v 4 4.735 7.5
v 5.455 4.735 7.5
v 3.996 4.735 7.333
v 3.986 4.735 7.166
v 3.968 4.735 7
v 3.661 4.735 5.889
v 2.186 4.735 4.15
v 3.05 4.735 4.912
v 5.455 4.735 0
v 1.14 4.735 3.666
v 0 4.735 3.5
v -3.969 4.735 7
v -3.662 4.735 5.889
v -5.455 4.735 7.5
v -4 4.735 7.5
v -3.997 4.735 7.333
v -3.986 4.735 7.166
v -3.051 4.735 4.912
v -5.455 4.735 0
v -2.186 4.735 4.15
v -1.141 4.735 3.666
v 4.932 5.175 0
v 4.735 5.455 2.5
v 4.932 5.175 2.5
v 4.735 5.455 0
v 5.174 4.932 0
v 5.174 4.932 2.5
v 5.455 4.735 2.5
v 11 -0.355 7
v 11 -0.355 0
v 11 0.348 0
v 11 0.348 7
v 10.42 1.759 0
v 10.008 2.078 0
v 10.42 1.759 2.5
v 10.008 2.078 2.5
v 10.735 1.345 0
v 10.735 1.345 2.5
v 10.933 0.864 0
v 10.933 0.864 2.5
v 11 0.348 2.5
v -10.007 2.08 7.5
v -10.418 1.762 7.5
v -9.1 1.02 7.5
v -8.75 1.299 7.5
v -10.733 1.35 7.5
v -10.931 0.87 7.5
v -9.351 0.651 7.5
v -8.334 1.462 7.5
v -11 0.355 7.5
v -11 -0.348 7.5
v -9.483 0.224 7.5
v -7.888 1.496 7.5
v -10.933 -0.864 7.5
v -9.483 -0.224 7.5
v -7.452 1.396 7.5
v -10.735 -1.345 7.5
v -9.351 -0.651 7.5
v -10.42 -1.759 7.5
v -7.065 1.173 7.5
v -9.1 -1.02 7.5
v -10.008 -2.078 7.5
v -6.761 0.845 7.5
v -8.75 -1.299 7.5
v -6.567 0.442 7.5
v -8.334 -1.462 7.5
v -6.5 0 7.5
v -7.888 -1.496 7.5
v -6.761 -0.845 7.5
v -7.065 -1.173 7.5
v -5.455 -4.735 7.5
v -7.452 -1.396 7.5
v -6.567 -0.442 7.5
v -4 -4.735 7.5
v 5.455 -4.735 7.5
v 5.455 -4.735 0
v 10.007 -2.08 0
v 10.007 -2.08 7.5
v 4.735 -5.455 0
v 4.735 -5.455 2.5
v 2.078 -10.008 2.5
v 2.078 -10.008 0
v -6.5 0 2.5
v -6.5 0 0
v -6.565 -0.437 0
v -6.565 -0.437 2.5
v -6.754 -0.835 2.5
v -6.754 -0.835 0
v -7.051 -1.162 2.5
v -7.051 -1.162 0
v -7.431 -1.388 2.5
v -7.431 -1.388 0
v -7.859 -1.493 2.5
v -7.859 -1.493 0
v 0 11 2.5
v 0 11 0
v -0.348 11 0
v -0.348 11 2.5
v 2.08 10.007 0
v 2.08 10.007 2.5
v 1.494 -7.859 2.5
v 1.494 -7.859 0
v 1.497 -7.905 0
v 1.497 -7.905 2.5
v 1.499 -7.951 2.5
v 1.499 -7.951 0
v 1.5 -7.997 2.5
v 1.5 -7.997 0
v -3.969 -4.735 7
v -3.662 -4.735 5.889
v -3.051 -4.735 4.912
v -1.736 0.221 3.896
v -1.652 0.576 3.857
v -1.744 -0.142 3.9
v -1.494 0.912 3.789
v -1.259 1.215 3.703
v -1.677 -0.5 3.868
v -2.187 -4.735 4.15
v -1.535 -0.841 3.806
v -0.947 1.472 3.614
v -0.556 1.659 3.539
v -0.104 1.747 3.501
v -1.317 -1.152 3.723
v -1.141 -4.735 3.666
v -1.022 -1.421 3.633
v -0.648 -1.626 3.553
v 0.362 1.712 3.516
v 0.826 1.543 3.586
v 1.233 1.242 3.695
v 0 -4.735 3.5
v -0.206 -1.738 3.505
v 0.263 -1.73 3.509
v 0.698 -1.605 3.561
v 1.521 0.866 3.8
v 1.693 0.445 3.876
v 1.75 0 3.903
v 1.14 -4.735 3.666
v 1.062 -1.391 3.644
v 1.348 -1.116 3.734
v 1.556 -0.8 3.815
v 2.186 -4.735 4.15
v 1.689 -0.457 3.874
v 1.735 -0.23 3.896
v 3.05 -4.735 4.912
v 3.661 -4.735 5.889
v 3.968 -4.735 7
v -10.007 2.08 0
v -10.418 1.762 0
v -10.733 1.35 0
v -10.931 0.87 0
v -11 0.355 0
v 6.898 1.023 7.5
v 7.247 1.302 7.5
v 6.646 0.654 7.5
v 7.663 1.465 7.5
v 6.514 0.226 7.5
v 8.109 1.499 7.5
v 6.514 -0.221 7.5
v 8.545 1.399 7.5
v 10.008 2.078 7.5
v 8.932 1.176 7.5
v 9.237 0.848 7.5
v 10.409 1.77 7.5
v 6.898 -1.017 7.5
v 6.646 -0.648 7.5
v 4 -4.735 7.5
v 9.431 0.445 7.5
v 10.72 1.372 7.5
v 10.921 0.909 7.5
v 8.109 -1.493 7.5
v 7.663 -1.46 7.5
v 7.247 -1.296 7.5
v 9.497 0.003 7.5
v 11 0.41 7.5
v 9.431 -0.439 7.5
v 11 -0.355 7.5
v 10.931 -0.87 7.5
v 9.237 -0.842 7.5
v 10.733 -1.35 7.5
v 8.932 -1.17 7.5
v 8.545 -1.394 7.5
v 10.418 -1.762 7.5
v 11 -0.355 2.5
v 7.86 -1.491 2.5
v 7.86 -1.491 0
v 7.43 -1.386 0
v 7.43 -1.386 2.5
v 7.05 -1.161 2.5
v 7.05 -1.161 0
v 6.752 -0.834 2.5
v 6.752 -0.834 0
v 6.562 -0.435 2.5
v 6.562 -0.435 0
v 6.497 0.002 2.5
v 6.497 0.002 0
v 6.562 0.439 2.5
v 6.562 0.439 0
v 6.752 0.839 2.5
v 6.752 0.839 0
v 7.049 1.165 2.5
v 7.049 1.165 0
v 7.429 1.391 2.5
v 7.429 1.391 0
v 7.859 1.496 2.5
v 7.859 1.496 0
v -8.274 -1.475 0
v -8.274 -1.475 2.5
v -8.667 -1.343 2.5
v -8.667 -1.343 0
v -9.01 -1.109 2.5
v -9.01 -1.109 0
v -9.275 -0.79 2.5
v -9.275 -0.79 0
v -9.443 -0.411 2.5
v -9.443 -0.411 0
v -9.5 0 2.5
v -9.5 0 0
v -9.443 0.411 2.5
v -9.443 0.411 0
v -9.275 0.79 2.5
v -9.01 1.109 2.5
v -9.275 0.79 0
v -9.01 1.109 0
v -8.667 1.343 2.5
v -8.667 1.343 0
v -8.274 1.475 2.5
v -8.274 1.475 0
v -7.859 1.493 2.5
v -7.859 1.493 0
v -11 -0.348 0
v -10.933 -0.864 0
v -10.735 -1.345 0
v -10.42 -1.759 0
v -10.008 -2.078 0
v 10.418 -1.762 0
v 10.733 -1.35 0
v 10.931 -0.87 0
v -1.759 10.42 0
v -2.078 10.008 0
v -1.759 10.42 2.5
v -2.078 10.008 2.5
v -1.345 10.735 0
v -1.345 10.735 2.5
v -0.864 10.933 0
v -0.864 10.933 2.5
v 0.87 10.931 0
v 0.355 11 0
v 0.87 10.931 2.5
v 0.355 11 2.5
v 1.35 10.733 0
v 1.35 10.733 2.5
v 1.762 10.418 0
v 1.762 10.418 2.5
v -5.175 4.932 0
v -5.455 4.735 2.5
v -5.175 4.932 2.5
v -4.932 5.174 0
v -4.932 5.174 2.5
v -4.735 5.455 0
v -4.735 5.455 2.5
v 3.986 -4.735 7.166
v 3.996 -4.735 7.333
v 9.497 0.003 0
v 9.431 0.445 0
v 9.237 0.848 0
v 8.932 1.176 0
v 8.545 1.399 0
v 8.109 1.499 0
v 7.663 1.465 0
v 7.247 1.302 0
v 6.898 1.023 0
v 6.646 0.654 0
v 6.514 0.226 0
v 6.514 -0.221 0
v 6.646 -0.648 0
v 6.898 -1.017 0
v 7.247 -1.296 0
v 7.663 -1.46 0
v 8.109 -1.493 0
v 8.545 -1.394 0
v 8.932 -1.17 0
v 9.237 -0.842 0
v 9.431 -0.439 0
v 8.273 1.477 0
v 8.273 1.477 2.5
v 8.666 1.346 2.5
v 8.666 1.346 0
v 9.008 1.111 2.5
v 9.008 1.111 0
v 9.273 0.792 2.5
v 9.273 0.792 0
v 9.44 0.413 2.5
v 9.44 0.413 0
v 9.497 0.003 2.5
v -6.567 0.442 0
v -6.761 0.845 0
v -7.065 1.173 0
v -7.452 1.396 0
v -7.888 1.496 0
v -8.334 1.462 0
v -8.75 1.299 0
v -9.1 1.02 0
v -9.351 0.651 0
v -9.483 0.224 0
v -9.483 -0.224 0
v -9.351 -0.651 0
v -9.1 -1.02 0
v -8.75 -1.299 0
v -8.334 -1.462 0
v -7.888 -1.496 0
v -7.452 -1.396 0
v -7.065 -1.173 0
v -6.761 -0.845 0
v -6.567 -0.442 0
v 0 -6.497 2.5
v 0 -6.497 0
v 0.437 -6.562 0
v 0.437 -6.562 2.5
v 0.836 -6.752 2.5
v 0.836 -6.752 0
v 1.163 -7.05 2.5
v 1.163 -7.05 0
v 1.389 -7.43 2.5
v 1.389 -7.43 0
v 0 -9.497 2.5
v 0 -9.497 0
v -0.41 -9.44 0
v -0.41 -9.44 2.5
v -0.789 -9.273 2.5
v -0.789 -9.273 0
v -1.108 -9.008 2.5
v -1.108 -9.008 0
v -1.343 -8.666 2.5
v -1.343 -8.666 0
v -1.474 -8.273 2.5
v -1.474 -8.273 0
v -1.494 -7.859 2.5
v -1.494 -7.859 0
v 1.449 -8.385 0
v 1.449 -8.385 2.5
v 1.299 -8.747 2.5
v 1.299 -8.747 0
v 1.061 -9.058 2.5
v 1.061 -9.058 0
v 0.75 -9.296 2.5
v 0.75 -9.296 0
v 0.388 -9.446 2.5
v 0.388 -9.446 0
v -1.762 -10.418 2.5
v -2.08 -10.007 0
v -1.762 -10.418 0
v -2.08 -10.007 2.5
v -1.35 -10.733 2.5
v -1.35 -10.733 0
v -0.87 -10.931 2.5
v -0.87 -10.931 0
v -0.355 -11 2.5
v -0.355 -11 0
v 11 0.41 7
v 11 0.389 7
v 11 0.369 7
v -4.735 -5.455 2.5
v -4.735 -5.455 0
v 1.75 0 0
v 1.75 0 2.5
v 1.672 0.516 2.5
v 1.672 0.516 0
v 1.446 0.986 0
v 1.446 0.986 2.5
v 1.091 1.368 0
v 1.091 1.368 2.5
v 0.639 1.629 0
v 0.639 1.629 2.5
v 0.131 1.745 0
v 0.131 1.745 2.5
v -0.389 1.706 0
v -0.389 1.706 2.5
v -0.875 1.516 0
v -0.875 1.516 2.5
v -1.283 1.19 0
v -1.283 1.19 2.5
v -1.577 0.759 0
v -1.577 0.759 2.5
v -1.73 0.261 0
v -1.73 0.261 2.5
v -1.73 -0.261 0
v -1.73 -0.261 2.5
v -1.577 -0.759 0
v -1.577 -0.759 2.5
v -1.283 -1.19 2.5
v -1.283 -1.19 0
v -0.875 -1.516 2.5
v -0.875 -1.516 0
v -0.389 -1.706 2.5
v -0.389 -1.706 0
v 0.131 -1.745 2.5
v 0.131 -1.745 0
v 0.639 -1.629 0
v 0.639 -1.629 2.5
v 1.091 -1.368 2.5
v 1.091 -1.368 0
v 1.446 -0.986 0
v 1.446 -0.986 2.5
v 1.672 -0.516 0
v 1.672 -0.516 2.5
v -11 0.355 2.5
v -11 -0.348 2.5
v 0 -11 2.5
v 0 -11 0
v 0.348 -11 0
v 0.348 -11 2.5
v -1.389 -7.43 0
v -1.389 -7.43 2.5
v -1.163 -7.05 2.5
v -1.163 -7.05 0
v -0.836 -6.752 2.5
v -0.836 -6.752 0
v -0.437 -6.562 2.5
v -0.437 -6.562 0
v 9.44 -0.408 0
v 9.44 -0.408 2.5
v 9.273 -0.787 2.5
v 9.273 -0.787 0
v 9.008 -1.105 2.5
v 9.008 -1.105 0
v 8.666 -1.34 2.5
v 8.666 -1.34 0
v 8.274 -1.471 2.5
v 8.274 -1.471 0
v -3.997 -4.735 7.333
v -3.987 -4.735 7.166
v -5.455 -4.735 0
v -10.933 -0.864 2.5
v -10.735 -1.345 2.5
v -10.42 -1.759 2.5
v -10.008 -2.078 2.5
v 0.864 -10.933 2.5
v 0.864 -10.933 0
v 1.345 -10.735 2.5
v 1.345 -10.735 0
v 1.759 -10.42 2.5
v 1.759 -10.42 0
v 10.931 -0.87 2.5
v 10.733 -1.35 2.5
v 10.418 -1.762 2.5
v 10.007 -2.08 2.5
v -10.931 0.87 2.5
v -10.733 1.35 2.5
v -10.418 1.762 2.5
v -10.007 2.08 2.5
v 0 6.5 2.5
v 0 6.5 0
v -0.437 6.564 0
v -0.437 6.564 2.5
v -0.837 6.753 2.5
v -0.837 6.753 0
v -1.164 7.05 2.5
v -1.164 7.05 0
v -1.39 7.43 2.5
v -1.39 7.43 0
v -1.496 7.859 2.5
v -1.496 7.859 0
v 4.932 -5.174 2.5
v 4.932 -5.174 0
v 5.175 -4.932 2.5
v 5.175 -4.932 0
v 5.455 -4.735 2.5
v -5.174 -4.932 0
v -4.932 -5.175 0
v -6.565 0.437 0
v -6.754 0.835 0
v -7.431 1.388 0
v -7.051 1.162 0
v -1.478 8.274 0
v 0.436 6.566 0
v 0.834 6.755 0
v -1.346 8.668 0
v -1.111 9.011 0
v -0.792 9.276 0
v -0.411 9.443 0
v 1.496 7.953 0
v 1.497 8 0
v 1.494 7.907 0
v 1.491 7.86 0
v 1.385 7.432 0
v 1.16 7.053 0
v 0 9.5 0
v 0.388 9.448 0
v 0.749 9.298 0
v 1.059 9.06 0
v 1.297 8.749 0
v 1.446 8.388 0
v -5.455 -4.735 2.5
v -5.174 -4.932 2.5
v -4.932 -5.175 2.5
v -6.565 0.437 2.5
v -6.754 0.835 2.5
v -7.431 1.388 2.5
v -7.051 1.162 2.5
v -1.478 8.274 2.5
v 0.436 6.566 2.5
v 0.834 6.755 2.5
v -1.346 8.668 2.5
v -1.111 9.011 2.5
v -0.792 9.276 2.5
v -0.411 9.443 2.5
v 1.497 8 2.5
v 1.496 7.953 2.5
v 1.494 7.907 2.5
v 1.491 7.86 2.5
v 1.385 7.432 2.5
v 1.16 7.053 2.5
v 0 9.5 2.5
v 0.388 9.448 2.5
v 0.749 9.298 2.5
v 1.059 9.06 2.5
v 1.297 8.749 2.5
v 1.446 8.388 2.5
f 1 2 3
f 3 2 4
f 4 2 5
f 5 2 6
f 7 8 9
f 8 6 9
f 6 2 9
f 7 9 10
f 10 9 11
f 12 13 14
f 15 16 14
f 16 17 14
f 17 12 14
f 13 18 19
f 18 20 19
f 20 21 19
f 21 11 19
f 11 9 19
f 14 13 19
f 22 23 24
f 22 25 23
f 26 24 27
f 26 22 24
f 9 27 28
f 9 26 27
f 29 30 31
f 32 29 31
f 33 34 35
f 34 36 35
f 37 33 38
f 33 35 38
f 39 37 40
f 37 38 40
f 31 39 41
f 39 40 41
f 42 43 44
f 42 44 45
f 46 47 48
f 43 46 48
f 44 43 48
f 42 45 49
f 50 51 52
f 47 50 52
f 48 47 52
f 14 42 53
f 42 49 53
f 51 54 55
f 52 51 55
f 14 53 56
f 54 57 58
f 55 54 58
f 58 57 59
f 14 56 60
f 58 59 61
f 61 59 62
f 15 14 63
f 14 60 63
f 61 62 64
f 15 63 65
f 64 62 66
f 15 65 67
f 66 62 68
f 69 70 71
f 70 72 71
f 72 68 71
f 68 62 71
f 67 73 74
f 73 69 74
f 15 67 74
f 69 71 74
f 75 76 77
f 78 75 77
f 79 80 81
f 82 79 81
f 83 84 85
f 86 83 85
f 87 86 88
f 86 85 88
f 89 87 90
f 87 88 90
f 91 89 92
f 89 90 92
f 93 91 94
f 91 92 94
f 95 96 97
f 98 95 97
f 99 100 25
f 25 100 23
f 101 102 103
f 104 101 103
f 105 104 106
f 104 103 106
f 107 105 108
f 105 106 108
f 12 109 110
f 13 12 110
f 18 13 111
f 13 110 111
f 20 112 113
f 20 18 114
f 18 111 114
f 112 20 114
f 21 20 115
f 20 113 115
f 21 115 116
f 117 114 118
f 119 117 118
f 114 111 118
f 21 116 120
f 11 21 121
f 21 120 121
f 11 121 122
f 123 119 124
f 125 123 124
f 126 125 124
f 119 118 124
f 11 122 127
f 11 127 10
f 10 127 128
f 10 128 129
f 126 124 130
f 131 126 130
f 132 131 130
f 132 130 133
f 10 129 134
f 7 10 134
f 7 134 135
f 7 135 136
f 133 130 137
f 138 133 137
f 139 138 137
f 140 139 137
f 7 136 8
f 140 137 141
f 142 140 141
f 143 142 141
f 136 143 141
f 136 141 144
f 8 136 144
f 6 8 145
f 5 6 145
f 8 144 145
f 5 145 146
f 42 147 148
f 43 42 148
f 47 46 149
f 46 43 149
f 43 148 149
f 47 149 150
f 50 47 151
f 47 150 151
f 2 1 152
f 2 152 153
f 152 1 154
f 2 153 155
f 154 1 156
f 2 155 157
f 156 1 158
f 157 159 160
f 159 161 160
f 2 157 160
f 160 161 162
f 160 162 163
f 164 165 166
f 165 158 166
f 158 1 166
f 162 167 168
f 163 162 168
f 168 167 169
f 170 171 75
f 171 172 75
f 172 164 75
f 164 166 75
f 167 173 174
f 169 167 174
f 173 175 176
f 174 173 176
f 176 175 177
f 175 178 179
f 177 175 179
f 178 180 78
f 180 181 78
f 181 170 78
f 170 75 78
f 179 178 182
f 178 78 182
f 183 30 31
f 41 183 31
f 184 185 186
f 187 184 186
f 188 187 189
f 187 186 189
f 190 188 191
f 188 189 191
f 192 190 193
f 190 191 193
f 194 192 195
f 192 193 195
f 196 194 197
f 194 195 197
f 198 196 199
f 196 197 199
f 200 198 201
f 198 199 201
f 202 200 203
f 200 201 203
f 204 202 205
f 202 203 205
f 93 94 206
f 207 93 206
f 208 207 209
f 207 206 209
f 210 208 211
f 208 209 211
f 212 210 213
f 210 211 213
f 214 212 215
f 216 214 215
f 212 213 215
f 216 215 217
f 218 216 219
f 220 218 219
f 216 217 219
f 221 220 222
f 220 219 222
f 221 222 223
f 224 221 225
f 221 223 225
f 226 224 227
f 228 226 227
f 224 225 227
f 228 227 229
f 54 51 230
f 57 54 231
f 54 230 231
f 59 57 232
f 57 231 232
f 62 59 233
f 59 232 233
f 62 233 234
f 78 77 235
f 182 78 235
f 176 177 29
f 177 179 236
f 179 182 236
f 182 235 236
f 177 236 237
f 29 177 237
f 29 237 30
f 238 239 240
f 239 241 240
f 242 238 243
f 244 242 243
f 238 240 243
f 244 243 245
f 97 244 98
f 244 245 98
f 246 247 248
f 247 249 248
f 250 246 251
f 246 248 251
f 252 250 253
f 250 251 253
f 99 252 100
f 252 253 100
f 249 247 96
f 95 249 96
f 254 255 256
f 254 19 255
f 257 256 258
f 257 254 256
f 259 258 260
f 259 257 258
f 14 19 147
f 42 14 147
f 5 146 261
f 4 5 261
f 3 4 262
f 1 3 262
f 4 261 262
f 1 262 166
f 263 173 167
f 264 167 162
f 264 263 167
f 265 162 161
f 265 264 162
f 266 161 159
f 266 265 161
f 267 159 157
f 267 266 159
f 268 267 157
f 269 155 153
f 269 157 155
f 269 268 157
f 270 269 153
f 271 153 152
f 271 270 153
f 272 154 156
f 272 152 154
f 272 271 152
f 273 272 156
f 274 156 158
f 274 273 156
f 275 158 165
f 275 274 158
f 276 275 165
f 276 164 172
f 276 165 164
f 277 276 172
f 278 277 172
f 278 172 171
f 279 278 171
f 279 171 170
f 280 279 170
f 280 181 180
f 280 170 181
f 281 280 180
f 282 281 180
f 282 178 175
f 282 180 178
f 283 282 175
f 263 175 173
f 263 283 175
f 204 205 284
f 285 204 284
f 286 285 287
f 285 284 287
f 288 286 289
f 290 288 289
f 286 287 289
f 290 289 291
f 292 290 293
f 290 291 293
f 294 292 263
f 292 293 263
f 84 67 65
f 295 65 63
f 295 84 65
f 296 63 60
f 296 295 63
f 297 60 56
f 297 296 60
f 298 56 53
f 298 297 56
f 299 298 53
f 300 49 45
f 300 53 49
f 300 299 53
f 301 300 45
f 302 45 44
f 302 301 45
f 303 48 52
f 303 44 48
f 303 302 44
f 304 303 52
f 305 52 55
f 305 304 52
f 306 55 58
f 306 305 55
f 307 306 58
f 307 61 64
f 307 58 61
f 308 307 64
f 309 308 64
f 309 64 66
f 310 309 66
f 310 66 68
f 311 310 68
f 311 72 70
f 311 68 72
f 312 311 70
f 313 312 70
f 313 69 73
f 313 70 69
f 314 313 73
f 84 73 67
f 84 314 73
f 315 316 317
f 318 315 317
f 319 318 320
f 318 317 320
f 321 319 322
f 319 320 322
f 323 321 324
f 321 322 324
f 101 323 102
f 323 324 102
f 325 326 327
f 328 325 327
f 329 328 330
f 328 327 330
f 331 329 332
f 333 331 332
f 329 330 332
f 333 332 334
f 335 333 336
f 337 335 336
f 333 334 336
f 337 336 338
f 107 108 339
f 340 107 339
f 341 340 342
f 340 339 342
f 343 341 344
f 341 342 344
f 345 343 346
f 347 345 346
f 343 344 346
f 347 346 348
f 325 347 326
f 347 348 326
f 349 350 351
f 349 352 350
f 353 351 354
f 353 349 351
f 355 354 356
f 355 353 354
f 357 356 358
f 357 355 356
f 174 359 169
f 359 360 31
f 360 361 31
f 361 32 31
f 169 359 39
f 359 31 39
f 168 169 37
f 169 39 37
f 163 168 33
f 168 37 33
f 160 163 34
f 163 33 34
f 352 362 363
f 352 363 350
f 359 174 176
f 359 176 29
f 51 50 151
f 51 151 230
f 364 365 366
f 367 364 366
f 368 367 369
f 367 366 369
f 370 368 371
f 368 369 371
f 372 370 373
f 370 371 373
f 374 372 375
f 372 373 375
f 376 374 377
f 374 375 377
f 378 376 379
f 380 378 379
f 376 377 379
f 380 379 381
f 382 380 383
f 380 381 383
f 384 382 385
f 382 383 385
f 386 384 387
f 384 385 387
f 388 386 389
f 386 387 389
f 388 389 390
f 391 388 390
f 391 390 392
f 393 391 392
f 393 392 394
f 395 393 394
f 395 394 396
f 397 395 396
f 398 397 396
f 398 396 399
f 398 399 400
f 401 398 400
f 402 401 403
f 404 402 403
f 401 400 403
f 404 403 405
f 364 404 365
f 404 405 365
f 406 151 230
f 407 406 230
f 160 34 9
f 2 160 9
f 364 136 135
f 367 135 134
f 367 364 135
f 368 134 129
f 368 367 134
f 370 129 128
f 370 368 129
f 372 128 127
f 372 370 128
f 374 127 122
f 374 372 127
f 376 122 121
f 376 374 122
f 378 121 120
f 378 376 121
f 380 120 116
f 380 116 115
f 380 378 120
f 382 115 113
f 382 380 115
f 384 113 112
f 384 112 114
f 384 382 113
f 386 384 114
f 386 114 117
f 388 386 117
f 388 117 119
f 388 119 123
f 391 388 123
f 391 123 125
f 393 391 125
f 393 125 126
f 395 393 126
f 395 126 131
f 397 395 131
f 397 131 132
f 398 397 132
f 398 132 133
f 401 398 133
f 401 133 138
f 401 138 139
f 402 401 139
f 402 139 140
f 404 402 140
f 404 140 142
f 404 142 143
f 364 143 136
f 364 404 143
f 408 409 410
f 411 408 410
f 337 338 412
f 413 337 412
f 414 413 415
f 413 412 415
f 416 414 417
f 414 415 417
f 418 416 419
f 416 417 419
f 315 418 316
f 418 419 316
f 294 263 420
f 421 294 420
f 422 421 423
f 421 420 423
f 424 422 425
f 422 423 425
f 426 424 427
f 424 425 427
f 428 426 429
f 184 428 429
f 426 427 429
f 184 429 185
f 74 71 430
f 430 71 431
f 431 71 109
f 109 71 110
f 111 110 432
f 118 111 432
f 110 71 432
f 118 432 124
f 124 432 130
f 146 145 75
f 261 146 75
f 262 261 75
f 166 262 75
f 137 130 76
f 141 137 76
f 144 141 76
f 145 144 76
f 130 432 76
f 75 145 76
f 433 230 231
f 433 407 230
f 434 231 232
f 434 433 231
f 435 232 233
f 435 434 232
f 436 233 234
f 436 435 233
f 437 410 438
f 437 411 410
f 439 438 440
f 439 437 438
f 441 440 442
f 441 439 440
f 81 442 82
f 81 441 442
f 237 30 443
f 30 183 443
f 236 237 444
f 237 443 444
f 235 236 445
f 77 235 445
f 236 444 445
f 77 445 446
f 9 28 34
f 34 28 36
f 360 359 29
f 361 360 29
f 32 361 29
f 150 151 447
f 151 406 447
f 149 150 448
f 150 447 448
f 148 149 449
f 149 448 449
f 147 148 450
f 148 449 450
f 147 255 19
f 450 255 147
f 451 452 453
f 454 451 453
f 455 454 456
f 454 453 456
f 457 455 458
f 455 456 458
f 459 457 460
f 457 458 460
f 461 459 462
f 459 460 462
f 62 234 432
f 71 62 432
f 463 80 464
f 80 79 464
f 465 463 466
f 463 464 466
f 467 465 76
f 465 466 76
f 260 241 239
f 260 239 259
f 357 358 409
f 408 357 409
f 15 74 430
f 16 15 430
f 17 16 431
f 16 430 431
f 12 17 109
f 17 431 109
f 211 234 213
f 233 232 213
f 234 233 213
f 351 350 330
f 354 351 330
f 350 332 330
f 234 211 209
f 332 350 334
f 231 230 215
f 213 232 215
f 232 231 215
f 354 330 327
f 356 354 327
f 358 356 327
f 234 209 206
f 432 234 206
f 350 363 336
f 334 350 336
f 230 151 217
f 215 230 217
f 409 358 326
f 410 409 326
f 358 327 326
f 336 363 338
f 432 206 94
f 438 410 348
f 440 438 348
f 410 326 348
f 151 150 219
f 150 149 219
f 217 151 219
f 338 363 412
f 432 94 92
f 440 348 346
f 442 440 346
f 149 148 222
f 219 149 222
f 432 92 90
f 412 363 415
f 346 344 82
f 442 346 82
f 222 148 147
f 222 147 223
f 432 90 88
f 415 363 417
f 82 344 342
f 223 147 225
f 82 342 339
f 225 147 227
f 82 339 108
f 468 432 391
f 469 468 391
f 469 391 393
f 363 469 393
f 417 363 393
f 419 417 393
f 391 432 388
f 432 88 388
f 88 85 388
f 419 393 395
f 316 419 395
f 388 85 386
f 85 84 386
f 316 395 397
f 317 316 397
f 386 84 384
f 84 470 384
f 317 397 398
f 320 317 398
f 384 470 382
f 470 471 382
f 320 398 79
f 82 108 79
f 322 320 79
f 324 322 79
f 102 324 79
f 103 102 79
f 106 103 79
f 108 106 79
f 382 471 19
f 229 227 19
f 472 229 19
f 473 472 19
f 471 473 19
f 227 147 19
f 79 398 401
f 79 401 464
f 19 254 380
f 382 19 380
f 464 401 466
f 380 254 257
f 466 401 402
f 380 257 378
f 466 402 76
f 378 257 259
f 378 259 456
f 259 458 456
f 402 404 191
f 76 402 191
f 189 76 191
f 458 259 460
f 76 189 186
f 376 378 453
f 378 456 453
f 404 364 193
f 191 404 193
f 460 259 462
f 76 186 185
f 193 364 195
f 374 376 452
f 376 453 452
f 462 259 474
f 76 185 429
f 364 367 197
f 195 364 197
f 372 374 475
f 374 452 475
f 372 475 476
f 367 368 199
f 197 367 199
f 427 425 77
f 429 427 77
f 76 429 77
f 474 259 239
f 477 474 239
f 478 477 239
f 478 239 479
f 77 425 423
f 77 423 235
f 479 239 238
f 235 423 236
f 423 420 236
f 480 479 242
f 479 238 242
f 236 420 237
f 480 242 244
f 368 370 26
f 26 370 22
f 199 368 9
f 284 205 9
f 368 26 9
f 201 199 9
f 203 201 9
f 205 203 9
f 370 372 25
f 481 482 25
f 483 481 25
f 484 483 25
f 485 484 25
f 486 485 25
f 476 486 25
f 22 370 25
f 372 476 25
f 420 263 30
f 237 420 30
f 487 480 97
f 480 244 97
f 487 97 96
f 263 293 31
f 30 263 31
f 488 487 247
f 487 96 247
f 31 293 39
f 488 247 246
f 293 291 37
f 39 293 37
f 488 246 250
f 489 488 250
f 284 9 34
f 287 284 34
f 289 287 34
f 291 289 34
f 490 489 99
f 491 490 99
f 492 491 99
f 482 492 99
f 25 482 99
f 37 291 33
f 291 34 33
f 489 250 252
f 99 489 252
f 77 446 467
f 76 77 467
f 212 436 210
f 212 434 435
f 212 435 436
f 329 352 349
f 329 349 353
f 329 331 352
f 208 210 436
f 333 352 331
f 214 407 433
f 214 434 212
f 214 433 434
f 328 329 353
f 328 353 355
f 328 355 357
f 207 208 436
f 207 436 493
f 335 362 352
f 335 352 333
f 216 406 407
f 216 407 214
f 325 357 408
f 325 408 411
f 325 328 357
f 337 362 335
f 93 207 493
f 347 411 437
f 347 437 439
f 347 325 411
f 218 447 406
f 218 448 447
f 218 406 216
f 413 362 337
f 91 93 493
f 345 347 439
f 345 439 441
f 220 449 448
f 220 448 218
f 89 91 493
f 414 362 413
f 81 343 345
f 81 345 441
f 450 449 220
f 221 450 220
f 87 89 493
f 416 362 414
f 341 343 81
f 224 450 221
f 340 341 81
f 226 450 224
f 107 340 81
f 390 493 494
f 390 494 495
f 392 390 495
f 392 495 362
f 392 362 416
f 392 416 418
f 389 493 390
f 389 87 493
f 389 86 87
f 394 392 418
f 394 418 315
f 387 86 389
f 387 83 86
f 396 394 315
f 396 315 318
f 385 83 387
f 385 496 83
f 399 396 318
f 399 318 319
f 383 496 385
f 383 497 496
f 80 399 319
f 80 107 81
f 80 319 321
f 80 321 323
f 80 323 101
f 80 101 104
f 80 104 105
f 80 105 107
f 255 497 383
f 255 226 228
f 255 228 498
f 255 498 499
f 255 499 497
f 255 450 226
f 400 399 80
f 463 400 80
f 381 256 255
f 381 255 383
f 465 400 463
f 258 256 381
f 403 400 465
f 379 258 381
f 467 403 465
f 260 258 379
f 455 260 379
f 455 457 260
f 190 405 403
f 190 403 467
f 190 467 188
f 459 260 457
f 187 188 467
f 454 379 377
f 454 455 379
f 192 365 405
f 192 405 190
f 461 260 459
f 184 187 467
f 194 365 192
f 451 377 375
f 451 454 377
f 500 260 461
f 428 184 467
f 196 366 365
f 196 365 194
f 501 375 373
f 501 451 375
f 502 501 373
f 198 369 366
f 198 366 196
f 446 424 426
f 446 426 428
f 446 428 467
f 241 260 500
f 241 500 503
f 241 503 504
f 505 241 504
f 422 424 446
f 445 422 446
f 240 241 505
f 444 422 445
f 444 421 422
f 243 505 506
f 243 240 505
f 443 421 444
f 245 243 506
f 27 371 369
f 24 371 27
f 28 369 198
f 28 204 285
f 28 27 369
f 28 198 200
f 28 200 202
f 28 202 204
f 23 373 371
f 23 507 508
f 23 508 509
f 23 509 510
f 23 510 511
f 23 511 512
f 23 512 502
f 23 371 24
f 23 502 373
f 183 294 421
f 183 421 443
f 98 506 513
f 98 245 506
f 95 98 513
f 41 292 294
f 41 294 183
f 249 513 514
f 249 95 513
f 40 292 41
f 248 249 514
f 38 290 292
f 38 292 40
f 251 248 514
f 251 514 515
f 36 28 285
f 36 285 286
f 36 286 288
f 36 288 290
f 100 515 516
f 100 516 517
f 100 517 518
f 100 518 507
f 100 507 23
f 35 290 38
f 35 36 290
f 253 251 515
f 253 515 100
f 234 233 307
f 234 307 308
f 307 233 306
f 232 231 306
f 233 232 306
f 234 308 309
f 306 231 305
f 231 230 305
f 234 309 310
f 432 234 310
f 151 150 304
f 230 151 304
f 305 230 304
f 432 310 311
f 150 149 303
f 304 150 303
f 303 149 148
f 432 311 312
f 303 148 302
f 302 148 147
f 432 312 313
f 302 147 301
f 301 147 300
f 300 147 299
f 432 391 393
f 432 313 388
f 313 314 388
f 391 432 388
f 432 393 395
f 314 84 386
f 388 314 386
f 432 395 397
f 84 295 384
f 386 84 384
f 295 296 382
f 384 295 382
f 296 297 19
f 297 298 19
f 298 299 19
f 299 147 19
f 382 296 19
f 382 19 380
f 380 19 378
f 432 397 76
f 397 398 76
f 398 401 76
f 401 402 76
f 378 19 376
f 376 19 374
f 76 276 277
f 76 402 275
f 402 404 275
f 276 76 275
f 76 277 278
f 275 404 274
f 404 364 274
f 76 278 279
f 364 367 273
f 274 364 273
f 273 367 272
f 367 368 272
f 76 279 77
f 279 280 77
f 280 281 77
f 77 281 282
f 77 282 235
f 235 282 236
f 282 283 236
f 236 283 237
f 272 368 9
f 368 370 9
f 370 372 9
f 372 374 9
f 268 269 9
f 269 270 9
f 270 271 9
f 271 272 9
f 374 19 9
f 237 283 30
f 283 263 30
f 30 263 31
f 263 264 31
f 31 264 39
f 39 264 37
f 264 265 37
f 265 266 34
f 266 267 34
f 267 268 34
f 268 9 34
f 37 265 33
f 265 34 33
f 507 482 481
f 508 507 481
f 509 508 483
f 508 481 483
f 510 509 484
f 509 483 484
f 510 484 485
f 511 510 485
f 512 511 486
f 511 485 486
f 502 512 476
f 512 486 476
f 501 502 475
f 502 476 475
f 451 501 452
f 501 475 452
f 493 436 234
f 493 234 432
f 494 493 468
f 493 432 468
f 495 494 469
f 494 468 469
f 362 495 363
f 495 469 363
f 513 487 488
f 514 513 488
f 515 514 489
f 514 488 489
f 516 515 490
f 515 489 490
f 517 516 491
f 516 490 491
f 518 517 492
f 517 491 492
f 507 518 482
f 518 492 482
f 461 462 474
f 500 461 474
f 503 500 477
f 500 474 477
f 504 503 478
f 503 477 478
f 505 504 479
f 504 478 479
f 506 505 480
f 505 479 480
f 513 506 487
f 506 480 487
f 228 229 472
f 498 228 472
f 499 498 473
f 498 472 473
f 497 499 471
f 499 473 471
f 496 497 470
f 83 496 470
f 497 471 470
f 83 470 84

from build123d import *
from OCP.BRepAlgoAPI import BRepAlgoAPI_Cut
from OCP.TopTools import TopTools_ListOfShape

# Parameters (mm, degrees)
SKETCH1_R           = 1.5
BOSS_EXTRUDE1_DEPTH = 2.5
CUT_EXTRUDE1_DEPTH  = 2.5
SKETCH3_R           = 1.75
CUT_EXTRUDE2_DEPTH  = 2.5
FILLET1_R           = 2
SKETCH4_R           = 1.5
SKETCH4_R_2         = 1.75
BOSS_EXTRUDE2_DEPTH = 15
CUT_EXTRUDE3_DEPTH  = 10


with BuildPart() as part:
    # Sketch1 → Boss-Extrude1 (new body)
    with BuildSketch(Plane.XY):
        Polygon((1.501919425, 10.998080575), (-1.498048949, 11.001951051), (-10.998080575, 1.501919425), (-11.001951051, -1.498048949), (-1.501919425, -10.998080575), (1.498048949, -11.001951051), (10.998080575, -1.501919425), (11.001951051, 1.498048949), align=None)
        with Locations((-0.002801443, 8)):
            Circle(SKETCH1_R, mode=Mode.SUBTRACT)
        with Locations((7.997198557, 0.002801443)):
            Circle(SKETCH1_R, mode=Mode.SUBTRACT)
        with Locations((0, -7.997198557)):
            Circle(SKETCH1_R, mode=Mode.SUBTRACT)
        with Locations((-8, 0)):
            Circle(SKETCH1_R, mode=Mode.SUBTRACT)
    extrude(amount=BOSS_EXTRUDE1_DEPTH)

    # Sketch2 → Cut-Extrude1 (cut)
    with BuildSketch(Plane.XY.offset(2.5)):
        Polygon((-10.998080575, 1.501919425), (-5, 5), (-1.498048949, 11.001951051), align=None)
        Polygon((-1.501919425, -10.998080575), (-5, -5), (-11.001951051, -1.498048949), align=None)
        Polygon((1.501919425, 10.998080575), (5, 5), (11.001951051, 1.498048949), align=None)
        Polygon((10.998080575, -1.501919425), (5, -5), (1.498048949, -11.001951051), align=None)
    extrude(amount=-CUT_EXTRUDE1_DEPTH, mode=Mode.SUBTRACT)

    # Sketch3 → Cut-Extrude2 (cut)
    with BuildSketch(Plane.XY.offset(2.5)):
        Circle(SKETCH3_R)
    extrude(amount=-CUT_EXTRUDE2_DEPTH, mode=Mode.SUBTRACT)

    # Fillet1
    fillet1_edges = [part.edges().sort_by_distance(p)[0] for p in [
        (-10.998080575, 1.501919425, 1.25),
        (-5, 5, 1.25),
        (-1.498048949, 11.001951051, 1.25),
        (1.501919425, 10.998080575, 1.25),
        (5, 5, 1.25),
        (11.001951051, 1.498048949, 1.25),
        (10.998080575, -1.501919425, 1.25),
        (5, -5, 1.25),
        (1.498048949, -11.001951051, 1.25),
        (-1.501919425, -10.998080575, 1.25),
        (-5, -5, 1.25),
        (-11.001951051, -1.498048949, 1.25),
    ]]
    fillet(fillet1_edges, radius=FILLET1_R)


with BuildPart() as body_2:
    # Sketch4 → Boss-Extrude2 (new body)
    with BuildSketch(Plane.XY):
        with BuildLine():
            Line((5.454592231, 4.734759626), (-5.454645413, 4.734850796))
            Line((-5.454645413, 4.734850796), (-10.007132442, 2.079840374))
            ThreePointArc((-10.007132442, 2.079840374), (-10.733154021, 1.349508566), (-10.999560605, 0.354762663))
            Line((-10.999560605, 0.354762663), (-11.000466938, -0.347727289))
            ThreePointArc((-11.000466938, -0.347727289), (-10.735445402, -1.345222455), (-10.008385222, -2.07776359))
            Line((-10.008385222, -2.07776359), (-5.454592231, -4.734759626))
            Line((-5.454592231, -4.734759626), (5.454645413, -4.734850796))
            Line((5.454645413, -4.734850796), (10.007132442, -2.079840374))
            ThreePointArc((10.007132442, -2.079840374), (10.733154021, -1.349508566), (10.999560605, -0.354762663))
            Line((10.999560605, -0.354762663), (11.000466938, 0.347727289))
            ThreePointArc((11.000466938, 0.347727289), (10.735445402, 1.345222455), (10.008385222, 2.07776359))
            Line((10.008385222, 2.07776359), (5.454592231, 4.734759626))
        make_face()
        with Locations((-8, 0)):
            Circle(SKETCH4_R, mode=Mode.SUBTRACT)
        Circle(SKETCH4_R_2, mode=Mode.SUBTRACT)
        with Locations((7.997198557, 0.002801443)):
            Circle(SKETCH4_R, mode=Mode.SUBTRACT)
    extrude(amount=BOSS_EXTRUDE2_DEPTH)


with BuildPart() as cut_extrude3_tool:
    # Sketch5 → Cut-Extrude3 (new body)
    with BuildSketch(Plane(origin=(-3.9569e-05, -4.734805211, 0), x_dir=(0.9999999999650793, -8.357134608074512e-06, 0), z_dir=(-8.357134608074512e-06, -0.9999999999650793, 0))):
        with BuildLine():
            Line((-11.000464032, 7.5), (-4.000450231, 7.5))
            ThreePointArc((-4.000450231, 7.5), (-0.000450231, 3.5), (3.999549769, 7.5))
            Line((3.999549769, 7.5), (10.999563569, 7.5))
            Line((10.999563569, 7.5), (10.999563569, 7))
            Line((10.999563569, 7), (12.263859783, 7))
            Line((12.263859783, 7), (12.263859783, 16))
            Line((12.263859783, 16), (-11.000464032, 16))
            Line((-11.000464032, 16), (-11.000464032, 7.5))
        make_face()
    extrude(amount=-CUT_EXTRUDE3_DEPTH)


with BuildPart() as body_2_1:
    add(body_2.part)

    # Cut-Extrude3: cut by cut_extrude3_tool, with a tolerance
    cut_extrude3_stock = TopTools_ListOfShape()
    cut_extrude3_stock.Append(body_2_1.part.wrapped)
    cut_extrude3_tools = TopTools_ListOfShape()
    cut_extrude3_tools.Append(cut_extrude3_tool.part.wrapped)
    cut_extrude3_cut = BRepAlgoAPI_Cut()
    cut_extrude3_cut.SetArguments(cut_extrude3_stock)
    cut_extrude3_cut.SetTools(cut_extrude3_tools)
    cut_extrude3_cut.SetFuzzyValue(0.00001)
    cut_extrude3_cut.Build()
    add(Compound.cast(cut_extrude3_cut.Shape()).solids(), mode=Mode.REPLACE)


solid = Compound([part.part, body_2_1.part])
